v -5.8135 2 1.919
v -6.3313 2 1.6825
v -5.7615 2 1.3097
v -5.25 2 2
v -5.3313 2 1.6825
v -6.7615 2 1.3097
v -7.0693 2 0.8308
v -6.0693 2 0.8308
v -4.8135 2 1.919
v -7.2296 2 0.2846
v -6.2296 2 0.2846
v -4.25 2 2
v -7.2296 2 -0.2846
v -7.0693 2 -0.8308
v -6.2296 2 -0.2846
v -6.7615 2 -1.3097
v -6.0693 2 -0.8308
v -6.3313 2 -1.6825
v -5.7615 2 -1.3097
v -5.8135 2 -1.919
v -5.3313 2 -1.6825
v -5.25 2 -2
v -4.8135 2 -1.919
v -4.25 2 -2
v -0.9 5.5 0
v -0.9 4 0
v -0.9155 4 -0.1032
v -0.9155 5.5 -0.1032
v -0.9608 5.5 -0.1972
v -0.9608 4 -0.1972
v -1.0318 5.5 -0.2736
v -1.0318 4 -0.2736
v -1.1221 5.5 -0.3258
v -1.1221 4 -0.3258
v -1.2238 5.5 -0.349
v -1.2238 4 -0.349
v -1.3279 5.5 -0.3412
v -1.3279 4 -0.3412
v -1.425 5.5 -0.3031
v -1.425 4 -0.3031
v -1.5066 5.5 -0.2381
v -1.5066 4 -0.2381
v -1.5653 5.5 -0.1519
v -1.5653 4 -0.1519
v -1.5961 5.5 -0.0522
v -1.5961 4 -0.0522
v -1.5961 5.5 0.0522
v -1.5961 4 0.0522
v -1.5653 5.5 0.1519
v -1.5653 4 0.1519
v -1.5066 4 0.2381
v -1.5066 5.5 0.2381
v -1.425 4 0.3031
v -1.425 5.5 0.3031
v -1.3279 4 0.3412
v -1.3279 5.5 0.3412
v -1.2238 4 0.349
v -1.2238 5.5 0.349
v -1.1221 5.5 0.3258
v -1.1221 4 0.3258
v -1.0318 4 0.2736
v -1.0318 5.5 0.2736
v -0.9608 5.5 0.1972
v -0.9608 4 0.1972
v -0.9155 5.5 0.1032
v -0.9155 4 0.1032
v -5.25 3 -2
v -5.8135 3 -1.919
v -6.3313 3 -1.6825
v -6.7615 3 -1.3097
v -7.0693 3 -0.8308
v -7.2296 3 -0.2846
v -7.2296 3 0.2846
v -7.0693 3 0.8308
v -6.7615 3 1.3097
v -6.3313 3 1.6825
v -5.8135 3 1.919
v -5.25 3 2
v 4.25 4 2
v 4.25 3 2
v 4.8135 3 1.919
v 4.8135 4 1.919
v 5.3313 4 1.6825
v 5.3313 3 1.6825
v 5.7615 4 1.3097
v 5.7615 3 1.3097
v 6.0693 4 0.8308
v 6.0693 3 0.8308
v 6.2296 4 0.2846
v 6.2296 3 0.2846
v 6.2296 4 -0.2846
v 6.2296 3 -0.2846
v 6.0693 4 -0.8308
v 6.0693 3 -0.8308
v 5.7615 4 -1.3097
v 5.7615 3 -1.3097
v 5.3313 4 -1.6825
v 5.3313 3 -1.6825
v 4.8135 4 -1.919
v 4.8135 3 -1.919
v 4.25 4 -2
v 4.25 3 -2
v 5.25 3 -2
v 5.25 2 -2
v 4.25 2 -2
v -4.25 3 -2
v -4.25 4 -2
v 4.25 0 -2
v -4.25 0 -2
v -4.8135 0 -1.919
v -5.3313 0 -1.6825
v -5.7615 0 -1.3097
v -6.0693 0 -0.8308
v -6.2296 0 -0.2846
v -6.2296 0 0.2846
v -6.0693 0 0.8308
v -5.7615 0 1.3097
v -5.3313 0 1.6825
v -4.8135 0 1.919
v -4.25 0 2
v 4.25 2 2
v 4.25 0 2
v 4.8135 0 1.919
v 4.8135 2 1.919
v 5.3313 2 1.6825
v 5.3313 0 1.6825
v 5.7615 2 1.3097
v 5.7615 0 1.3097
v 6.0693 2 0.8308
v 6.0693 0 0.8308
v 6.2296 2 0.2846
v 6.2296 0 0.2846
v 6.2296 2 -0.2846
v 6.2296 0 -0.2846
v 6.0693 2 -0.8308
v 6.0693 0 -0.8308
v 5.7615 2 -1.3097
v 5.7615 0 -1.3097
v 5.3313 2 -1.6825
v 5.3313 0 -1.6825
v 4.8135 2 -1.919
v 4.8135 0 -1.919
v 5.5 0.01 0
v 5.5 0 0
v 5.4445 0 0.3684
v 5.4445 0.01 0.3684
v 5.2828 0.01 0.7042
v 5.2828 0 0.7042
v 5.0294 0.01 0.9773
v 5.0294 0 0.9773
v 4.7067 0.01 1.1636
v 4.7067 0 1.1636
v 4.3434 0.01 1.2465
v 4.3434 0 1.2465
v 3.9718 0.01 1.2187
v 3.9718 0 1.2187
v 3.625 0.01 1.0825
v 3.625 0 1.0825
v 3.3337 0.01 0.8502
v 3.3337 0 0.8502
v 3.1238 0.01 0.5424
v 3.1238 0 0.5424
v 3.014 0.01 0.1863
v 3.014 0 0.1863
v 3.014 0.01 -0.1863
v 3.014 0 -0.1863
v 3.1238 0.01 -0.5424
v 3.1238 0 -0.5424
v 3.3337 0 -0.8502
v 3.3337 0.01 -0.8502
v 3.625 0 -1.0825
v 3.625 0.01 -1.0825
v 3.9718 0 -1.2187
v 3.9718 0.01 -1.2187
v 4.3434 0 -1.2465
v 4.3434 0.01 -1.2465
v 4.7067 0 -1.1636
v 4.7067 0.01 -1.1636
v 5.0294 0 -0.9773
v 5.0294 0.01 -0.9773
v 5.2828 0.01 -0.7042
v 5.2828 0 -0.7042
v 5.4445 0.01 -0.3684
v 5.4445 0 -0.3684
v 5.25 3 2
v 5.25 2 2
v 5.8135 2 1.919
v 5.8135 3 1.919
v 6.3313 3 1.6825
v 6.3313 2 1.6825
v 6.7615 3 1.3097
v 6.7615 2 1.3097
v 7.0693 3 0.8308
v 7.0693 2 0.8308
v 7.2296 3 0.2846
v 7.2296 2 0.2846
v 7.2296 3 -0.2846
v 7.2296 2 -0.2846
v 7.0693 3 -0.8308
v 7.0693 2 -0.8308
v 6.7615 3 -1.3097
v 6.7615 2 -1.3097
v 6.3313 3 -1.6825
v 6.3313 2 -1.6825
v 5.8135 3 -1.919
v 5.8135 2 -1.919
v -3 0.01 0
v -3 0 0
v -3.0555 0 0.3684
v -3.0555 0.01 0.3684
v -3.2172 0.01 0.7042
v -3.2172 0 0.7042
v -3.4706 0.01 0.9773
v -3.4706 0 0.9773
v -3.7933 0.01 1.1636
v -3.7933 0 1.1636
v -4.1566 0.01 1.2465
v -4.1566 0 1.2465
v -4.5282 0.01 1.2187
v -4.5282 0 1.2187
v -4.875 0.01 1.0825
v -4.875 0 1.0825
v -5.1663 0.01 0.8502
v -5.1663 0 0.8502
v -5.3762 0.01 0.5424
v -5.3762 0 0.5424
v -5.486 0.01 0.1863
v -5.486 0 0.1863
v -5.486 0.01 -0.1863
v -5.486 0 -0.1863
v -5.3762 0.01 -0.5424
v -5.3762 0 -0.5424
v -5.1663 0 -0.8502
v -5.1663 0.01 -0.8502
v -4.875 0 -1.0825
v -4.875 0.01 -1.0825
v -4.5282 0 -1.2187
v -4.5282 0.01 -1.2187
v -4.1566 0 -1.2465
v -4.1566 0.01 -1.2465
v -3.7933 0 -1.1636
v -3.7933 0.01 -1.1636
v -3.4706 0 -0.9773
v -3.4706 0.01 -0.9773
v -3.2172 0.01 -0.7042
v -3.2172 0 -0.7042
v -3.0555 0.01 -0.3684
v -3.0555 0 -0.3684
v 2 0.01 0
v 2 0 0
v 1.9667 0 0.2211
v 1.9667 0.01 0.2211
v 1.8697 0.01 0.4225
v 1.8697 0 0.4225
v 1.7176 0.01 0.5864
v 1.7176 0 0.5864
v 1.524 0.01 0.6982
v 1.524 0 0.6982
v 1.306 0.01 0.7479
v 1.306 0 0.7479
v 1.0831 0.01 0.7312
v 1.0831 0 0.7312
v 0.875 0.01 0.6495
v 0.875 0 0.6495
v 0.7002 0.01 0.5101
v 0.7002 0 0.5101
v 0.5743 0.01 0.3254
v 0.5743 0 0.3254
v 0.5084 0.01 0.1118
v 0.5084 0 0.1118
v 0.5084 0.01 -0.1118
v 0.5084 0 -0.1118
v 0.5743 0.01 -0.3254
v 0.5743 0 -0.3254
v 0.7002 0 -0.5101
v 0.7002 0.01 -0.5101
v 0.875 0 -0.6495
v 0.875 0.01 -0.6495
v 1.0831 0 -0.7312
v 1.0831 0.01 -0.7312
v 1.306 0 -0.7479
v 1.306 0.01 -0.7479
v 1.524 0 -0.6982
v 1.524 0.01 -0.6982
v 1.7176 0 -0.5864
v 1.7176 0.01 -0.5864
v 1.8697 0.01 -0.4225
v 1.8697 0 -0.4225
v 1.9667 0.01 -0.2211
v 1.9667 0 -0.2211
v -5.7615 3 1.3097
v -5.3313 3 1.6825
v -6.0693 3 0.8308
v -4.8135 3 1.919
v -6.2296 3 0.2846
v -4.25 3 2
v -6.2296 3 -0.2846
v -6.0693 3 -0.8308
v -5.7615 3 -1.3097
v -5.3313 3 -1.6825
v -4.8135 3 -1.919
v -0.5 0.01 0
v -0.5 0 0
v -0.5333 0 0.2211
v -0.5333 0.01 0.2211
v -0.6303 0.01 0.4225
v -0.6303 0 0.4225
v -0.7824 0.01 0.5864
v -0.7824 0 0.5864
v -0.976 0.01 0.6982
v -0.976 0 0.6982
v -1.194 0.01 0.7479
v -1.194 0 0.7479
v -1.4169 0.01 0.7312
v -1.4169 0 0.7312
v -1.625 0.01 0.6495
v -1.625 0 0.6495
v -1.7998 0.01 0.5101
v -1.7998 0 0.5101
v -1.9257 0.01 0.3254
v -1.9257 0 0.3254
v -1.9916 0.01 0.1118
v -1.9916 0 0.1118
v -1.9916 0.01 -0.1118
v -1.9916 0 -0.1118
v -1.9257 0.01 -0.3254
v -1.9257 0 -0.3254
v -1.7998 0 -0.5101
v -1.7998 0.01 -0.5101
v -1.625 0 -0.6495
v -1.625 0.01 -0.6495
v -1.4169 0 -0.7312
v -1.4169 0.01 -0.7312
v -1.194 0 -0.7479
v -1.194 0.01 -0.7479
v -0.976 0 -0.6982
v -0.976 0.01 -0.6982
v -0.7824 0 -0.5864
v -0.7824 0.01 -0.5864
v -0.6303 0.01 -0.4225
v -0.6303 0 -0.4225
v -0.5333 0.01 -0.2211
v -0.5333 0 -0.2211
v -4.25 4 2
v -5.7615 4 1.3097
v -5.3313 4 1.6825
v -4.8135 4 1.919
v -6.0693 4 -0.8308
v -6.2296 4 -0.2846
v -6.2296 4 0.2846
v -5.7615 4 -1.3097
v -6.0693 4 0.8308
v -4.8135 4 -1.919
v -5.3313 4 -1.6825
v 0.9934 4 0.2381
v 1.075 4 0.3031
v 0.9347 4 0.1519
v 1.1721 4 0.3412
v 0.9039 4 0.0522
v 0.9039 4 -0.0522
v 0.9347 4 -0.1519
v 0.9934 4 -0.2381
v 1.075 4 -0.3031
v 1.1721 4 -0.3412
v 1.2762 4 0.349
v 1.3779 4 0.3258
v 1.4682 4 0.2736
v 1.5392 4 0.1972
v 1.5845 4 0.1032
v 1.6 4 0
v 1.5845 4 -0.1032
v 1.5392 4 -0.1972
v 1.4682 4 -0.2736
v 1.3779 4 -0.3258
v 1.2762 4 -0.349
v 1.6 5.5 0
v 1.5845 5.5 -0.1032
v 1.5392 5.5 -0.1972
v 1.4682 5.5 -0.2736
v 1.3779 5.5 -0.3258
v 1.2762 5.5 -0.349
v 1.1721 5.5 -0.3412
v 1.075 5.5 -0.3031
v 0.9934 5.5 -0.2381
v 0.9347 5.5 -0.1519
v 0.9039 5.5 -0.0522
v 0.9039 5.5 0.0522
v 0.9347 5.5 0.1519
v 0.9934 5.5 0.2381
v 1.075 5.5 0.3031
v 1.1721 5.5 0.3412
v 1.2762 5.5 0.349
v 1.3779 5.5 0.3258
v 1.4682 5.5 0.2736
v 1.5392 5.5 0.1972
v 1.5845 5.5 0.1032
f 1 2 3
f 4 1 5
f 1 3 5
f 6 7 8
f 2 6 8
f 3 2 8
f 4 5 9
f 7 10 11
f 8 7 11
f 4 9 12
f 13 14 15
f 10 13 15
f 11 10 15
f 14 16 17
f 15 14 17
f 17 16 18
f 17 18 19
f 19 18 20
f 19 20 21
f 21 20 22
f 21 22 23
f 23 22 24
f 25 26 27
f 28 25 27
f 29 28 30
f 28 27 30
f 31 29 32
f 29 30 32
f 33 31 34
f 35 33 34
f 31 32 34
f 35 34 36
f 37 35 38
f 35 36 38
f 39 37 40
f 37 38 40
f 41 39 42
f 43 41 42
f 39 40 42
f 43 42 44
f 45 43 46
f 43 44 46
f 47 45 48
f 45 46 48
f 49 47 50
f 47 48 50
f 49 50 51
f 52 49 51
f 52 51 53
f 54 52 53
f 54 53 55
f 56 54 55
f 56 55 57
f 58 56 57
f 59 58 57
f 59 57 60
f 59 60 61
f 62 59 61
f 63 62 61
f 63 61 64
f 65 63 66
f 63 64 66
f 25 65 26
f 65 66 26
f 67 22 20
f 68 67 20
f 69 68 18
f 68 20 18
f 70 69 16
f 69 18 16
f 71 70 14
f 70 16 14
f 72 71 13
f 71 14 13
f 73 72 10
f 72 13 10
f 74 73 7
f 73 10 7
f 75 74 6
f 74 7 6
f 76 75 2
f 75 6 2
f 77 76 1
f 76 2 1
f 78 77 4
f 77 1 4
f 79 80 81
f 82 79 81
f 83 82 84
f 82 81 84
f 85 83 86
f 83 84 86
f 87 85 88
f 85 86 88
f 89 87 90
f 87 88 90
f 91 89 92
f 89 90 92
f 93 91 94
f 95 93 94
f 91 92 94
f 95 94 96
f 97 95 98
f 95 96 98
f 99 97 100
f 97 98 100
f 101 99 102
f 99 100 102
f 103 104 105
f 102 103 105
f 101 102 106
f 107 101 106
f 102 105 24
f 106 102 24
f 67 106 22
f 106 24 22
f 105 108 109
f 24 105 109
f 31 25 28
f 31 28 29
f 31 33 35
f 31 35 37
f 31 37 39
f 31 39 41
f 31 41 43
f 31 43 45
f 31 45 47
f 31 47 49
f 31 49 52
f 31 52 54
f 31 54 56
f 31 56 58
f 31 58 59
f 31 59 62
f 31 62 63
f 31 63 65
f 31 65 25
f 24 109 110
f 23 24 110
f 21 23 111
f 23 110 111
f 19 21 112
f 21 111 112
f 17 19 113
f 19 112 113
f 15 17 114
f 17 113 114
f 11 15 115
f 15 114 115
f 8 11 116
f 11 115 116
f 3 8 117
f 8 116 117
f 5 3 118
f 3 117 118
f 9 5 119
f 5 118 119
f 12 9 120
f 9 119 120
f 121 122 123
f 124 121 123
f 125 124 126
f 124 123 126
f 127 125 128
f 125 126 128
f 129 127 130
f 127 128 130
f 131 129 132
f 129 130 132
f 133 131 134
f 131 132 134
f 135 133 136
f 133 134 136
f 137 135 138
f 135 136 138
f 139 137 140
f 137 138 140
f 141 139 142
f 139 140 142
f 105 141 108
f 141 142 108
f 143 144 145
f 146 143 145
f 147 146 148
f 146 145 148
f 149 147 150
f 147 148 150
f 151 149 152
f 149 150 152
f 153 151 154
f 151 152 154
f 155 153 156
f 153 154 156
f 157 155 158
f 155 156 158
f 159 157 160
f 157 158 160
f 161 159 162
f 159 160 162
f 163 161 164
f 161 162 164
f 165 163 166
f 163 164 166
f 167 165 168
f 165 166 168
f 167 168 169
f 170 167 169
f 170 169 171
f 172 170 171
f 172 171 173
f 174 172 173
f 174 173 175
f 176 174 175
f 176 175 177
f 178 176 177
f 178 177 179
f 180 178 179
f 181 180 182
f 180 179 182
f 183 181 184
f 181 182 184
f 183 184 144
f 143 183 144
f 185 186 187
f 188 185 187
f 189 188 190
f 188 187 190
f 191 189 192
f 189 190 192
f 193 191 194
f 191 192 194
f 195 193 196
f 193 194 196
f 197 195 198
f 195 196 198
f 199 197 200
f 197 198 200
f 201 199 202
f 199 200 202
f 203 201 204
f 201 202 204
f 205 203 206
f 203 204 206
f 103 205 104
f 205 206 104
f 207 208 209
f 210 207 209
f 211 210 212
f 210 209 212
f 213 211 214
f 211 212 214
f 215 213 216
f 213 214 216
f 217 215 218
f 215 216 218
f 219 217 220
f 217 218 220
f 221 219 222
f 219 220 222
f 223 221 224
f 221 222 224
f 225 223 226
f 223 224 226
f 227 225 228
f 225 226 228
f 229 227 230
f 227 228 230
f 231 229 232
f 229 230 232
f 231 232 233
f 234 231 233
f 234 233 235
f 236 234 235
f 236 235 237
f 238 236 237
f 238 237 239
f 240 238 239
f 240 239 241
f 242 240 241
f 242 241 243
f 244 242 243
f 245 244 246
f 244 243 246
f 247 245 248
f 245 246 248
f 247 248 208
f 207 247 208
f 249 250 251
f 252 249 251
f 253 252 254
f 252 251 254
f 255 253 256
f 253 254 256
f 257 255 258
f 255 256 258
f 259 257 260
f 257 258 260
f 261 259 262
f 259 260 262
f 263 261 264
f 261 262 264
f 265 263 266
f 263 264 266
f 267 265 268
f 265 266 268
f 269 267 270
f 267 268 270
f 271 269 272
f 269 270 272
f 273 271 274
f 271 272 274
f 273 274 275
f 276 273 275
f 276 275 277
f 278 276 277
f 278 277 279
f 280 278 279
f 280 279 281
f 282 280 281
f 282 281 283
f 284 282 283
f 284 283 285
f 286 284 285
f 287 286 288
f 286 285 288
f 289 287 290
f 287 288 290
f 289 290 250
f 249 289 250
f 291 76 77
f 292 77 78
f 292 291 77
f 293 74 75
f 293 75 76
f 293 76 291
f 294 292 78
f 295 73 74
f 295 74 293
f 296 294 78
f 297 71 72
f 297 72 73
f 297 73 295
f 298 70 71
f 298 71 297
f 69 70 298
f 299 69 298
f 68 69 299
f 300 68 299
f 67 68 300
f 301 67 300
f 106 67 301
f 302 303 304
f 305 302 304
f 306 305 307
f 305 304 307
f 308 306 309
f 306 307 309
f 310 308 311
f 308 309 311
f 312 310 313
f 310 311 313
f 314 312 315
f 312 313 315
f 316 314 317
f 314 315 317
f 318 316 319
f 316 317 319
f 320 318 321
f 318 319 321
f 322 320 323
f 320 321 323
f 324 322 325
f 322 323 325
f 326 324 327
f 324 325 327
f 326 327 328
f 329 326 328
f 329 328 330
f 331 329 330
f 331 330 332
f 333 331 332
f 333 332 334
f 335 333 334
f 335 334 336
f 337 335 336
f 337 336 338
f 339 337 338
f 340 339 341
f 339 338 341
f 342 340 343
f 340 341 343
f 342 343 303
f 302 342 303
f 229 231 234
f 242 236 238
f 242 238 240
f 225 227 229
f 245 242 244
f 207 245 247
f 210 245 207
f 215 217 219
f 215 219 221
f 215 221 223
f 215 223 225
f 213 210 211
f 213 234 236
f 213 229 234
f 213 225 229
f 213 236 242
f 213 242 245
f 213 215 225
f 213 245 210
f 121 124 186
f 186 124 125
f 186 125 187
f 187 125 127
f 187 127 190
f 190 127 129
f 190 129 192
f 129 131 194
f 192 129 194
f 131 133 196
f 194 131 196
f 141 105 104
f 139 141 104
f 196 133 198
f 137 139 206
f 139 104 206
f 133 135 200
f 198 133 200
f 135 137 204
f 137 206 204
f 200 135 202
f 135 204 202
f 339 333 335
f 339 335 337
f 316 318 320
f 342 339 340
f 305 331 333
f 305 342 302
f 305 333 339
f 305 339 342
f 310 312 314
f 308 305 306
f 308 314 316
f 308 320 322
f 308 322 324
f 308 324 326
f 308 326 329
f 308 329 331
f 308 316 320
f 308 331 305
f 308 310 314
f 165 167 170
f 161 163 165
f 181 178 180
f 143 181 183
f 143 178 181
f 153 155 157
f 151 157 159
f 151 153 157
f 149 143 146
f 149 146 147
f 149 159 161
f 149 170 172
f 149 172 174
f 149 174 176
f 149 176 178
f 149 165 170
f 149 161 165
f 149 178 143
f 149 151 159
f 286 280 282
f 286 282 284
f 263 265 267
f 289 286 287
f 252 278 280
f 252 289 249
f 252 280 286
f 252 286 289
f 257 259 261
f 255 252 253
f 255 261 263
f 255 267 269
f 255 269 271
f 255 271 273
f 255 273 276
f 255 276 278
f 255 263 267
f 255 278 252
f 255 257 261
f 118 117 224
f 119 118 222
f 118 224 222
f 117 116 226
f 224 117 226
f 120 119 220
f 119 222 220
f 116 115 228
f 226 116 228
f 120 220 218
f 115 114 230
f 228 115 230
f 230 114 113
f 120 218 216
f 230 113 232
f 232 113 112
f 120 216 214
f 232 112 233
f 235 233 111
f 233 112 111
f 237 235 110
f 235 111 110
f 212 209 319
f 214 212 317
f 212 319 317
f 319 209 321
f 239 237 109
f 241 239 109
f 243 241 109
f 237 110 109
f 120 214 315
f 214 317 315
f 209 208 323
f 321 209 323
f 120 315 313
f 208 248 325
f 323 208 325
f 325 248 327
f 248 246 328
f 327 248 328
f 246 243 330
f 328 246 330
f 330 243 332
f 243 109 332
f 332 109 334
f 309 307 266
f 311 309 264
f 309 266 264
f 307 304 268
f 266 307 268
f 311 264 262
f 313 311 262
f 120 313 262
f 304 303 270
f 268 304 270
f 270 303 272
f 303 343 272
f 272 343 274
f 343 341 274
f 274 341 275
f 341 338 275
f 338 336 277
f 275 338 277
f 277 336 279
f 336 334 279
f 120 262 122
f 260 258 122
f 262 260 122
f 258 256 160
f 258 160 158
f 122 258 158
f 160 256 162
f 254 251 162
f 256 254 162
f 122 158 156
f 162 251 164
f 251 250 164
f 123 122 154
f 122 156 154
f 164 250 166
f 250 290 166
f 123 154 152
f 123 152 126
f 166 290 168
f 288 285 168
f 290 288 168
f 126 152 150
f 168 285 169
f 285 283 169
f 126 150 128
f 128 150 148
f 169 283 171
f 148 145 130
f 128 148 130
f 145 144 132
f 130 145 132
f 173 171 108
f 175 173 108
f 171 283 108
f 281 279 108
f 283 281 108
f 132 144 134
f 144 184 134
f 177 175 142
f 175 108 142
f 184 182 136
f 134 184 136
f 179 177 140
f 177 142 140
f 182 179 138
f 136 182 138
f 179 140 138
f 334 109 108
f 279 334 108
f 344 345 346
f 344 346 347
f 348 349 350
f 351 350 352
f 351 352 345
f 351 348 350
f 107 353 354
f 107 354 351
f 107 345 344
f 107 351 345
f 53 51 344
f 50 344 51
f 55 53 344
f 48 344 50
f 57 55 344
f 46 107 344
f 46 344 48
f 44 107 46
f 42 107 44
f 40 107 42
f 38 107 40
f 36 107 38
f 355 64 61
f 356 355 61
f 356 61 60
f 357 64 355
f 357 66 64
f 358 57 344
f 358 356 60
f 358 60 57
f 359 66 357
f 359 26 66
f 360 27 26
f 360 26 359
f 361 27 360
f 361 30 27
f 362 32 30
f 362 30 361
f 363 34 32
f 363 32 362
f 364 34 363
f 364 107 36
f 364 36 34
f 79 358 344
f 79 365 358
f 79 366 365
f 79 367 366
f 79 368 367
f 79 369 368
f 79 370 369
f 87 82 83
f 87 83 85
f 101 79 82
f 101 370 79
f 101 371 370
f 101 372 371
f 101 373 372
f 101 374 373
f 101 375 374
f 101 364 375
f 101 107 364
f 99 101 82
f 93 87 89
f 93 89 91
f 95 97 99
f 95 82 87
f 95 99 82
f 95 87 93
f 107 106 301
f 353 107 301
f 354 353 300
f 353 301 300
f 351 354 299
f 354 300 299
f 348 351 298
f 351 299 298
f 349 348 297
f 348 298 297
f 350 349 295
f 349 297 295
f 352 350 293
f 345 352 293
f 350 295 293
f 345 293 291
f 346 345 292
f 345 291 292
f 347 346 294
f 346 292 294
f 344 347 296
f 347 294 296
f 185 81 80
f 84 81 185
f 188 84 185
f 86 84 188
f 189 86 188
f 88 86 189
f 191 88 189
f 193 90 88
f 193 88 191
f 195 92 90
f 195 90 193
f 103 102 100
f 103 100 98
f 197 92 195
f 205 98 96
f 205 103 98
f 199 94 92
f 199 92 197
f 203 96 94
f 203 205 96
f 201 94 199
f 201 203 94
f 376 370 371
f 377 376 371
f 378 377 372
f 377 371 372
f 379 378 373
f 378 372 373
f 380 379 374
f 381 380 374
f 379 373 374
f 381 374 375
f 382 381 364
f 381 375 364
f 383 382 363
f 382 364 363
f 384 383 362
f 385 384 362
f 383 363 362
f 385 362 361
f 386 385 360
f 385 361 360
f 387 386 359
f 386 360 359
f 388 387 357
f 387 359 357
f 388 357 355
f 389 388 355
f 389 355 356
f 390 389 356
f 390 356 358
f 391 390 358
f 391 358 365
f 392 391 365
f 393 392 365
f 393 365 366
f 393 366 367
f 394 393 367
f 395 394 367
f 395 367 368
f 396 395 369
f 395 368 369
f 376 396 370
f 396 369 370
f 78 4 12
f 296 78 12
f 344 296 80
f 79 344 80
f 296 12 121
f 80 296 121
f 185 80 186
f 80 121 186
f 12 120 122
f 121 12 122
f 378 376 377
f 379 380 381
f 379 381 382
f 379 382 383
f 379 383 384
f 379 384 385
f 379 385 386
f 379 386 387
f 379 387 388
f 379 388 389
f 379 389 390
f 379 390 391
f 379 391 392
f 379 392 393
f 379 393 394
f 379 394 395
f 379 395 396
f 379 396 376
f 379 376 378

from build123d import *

# Parameters (mm, degrees)
BOSS_EXTRUDE1_DEPTH = 4
BOSS_EXTRUDE2_START = 2
BOSS_EXTRUDE2_DEPTH = 1
SKETCH2_R           = 0.35
BOSS_EXTRUDE3_DEPTH = 1.5
SKETCH3_R           = 0.75
SKETCH3_R_2         = 1.25
CUT_EXTRUDE1_DEPTH  = 0.01


with BuildPart() as part:
    # Sketch1 → Boss-Extrude1 (new body)
    with BuildSketch(Plane(origin=(0, 0, 0), x_dir=(1, 0, 0), z_dir=(0, 1, 0))):
        with BuildLine():
            Line((4.25, 2), (-4.25, 2))
            ThreePointArc((-4.25, 2), (-6.25, 0), (-4.25, -2))
            Line((-4.25, -2), (4.25, -2))
            ThreePointArc((4.25, -2), (6.25, 0), (4.25, 2))
        make_face()
    extrude(amount=BOSS_EXTRUDE1_DEPTH)

    # Sketch1<3> → Boss-Extrude2 (add)
    with BuildSketch(Plane(origin=(0, 0, 0), x_dir=(1, 0, 0), z_dir=(0, 1, 0)).offset(BOSS_EXTRUDE2_START)):
        with BuildLine():
            Line((5.25, 2), (4.25, 2))
            ThreePointArc((4.25, 2), (6.25, 0), (4.25, -2))
            Line((4.25, -2), (5.25, -2))
            ThreePointArc((5.25, -2), (7.25, 0), (5.25, 2))
        make_face()
        with BuildLine():
            Line((-4.25, 2), (-5.25, 2))
            ThreePointArc((-5.25, 2), (-7.25, 0), (-5.25, -2))
            Line((-5.25, -2), (-4.25, -2))
            ThreePointArc((-4.25, -2), (-6.25, 0), (-4.25, 2))
        make_face()
    extrude(amount=BOSS_EXTRUDE2_DEPTH)

    # Sketch2 → Boss-Extrude3 (add)
    with BuildSketch(Plane(origin=(0, 4, 0), x_dir=(1, 0, 0), z_dir=(0, 1, 0))):
        with Locations((-1.25, 0)):
            Circle(SKETCH2_R)
        with Locations((1.25, 0)):
            Circle(SKETCH2_R)
    extrude(amount=BOSS_EXTRUDE3_DEPTH)

    # Sketch3 → Cut-Extrude1 (cut)
    with BuildSketch(Plane.XZ):
        with Locations((-1.25, 0)):
            Circle(SKETCH3_R)
        with Locations((1.25, 0)):
            Circle(SKETCH3_R)
        with Locations((4.25, 0)):
            Circle(SKETCH3_R_2)
        with Locations((-4.25, 0)):
            Circle(SKETCH3_R_2)
    extrude(amount=-CUT_EXTRUDE1_DEPTH, mode=Mode.SUBTRACT)


solid = part.part
